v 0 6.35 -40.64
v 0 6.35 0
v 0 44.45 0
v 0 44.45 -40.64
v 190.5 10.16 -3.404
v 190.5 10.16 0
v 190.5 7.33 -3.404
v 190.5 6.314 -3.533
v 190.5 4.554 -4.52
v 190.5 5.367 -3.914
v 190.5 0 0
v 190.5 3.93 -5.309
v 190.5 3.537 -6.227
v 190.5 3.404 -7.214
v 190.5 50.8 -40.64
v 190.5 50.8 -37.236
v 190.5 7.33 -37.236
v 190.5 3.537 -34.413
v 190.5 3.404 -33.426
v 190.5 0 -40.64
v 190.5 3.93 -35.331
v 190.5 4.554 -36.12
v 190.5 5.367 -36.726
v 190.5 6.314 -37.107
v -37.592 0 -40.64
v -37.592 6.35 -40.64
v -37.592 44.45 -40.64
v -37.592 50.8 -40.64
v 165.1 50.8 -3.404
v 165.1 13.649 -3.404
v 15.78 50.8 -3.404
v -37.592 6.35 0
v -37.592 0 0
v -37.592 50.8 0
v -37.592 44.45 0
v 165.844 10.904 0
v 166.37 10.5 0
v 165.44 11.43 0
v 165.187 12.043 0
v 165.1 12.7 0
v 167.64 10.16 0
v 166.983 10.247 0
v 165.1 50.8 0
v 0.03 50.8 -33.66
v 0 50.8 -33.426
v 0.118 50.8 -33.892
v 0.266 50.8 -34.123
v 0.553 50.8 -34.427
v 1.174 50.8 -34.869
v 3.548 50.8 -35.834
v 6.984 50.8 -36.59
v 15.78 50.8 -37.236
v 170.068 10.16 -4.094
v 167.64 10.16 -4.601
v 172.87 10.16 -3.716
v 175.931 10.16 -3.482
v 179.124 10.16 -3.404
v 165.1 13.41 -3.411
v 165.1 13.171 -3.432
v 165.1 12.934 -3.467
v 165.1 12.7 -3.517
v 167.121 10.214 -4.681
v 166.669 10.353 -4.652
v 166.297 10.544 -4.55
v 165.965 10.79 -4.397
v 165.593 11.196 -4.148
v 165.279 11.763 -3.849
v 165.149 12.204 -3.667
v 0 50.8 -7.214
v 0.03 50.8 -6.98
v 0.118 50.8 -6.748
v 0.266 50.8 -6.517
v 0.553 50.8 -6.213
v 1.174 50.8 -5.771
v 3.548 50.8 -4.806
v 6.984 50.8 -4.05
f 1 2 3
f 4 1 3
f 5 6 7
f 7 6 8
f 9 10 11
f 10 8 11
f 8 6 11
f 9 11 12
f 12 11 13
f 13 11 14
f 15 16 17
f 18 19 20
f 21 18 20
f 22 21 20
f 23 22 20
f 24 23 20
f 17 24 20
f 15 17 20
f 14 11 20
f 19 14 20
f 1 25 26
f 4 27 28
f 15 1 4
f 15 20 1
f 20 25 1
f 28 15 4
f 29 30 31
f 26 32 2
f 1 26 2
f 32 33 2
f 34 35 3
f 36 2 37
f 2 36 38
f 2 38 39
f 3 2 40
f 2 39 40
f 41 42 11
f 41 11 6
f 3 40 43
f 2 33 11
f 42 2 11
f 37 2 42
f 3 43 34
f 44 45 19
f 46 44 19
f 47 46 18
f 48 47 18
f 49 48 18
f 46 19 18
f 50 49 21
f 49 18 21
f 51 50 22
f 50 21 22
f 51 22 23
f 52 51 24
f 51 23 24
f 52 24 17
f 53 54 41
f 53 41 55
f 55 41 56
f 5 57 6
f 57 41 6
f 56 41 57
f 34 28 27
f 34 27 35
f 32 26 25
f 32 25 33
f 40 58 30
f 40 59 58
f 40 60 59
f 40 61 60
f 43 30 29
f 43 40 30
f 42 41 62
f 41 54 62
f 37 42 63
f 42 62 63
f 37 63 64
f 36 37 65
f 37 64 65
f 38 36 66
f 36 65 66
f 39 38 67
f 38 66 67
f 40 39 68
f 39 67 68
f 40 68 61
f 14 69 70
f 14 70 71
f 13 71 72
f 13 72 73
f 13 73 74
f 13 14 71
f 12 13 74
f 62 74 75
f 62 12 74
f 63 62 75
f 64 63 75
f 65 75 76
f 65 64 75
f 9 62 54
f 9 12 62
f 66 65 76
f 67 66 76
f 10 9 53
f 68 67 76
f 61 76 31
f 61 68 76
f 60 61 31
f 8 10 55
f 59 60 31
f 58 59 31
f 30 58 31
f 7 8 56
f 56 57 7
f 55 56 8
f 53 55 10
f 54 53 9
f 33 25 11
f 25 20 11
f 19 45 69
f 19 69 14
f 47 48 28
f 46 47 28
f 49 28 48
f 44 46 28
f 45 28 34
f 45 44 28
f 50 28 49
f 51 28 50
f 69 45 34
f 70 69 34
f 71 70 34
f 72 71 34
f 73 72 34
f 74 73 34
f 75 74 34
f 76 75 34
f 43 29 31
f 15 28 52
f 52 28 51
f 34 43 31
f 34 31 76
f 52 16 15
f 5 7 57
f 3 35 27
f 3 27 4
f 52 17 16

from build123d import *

# Parameters (mm, degrees)
SKETCH1_W           = 190.5
SKETCH1_H           = 40.64
BOSS_EXTRUDE1_DEPTH = 50.8
SKETCH2_W           = 33.8328
SKETCH2_H           = 53.486117269
CUT_EXTRUDE1_DEPTH  = 202.302010919
BOSS_EXTRUDE2_REACH = 191.307
SKETCH4_W           = 196.307587048
SKETCH4_H           = 33.8328
SKETCH6_W           = 25.4
SKETCH6_H           = 50.8
CUT_EXTRUDE3_DEPTH  = 202.302010919
FILLET1_R           = 3.81
SKETCH7_W           = 25.4
SKETCH7_H           = 40.64
CUT_EXTRUDE4_DEPTH  = 5.08
SKETCH8_W           = 40.64
SKETCH8_H           = 50.8
BOSS_EXTRUDE3_DEPTH = 37.592
FILLET2_R           = 2.54
SKETCH9_W           = 37.592
SKETCH9_H           = 38.1
CUT_EXTRUDE5_DEPTH  = 202.302011039


with BuildPart() as part:
    # Sketch1 → Boss-Extrude1 (new body)
    with BuildSketch(Plane(origin=(0, 0, 0), x_dir=(1, 0, 0), z_dir=(0, 1, 0))):
        with Locations((95.25, 20.32)):
            Rectangle(SKETCH1_W, SKETCH1_H)
    extrude(amount=BOSS_EXTRUDE1_DEPTH)

    # Sketch2 → Cut-Extrude1 (cut, through all)
    with BuildSketch(Plane(origin=(190.5, 0, 0), x_dir=(0, 0, -1), z_dir=(1, 0, 0))):
        with Locations((20.32, 30.146658634)):
            Rectangle(SKETCH2_W, SKETCH2_H)
    extrude(amount=-CUT_EXTRUDE1_DEPTH, mode=Mode.SUBTRACT)

    # Boss-Extrude2: up to this face of the body (flat: up to its plane)
    boss_extrude2_end = Plane(part.part.faces().sort_by_distance((95.25, 3.4036, -20.32))[0])
    # Sketch4 → Boss-Extrude2 (add, up to the picked face)
    with BuildSketch(Plane(origin=(11.902272211, 47.838714674, 0), x_dir=(0.9704158808316984, -0.24143947115092654, 0), z_dir=(0.2414394711509265, 0.9704158808316983, 0)), mode=Mode.PRIVATE) as boss_extrude2_sk1:
        with Locations((85.88866839, 20.32)):
            Rectangle(SKETCH4_W, SKETCH4_H)
    boss_extrude2_tool1 = split(extrude(boss_extrude2_sk1.sketch, amount=-BOSS_EXTRUDE2_REACH, mode=Mode.PRIVATE), bisect_by=boss_extrude2_end, keep=Keep.BOTH, mode=Mode.PRIVATE)
    add(boss_extrude2_tool1.solids().sort_by(Axis((95.25, 27.1018, -20.32), (-0.2414394711509265, -0.9704158808316983, 0)))[0])

    # Sketch6 → Cut-Extrude3 (cut, through all)
    with BuildSketch(Plane.XY):
        with Locations((-12.7, 25.4)):
            Rectangle(SKETCH6_W, SKETCH6_H)
    extrude(amount=-CUT_EXTRUDE3_DEPTH, mode=Mode.SUBTRACT)

    # Fillet1
    fillet1_edges = [part.edges().sort_by_distance(p)[0] for p in [
        (95.25, 27.1018, -3.4036),
        (95.25, 27.1018, -37.2364),
    ]]
    fillet(fillet1_edges, radius=FILLET1_R)

    # Sketch7 → Cut-Extrude4 (cut)
    with BuildSketch(Plane.XY):
        with Locations((177.8, 30.48)):
            Rectangle(SKETCH7_W, SKETCH7_H)
    extrude(amount=-CUT_EXTRUDE4_DEPTH, mode=Mode.SUBTRACT)

    # Sketch8 → Boss-Extrude3 (add)
    with BuildSketch(Plane.ZY):
        with Locations((-20.32, 25.4)):
            Rectangle(SKETCH8_W, SKETCH8_H)
    extrude(amount=BOSS_EXTRUDE3_DEPTH)

    # Fillet2
    fillet2_edges = [part.edges().sort_by_distance(p)[0] for p in [
        (165.1, 10.16, -2.54),
    ]]
    fillet(fillet2_edges, radius=FILLET2_R)

    # Sketch9 → Cut-Extrude5 (cut, through all)
    with BuildSketch(Plane.XY):
        with Locations((-18.796, 25.4)):
            Rectangle(SKETCH9_W, SKETCH9_H)
    extrude(amount=-CUT_EXTRUDE5_DEPTH, mode=Mode.SUBTRACT)


solid = part.part
